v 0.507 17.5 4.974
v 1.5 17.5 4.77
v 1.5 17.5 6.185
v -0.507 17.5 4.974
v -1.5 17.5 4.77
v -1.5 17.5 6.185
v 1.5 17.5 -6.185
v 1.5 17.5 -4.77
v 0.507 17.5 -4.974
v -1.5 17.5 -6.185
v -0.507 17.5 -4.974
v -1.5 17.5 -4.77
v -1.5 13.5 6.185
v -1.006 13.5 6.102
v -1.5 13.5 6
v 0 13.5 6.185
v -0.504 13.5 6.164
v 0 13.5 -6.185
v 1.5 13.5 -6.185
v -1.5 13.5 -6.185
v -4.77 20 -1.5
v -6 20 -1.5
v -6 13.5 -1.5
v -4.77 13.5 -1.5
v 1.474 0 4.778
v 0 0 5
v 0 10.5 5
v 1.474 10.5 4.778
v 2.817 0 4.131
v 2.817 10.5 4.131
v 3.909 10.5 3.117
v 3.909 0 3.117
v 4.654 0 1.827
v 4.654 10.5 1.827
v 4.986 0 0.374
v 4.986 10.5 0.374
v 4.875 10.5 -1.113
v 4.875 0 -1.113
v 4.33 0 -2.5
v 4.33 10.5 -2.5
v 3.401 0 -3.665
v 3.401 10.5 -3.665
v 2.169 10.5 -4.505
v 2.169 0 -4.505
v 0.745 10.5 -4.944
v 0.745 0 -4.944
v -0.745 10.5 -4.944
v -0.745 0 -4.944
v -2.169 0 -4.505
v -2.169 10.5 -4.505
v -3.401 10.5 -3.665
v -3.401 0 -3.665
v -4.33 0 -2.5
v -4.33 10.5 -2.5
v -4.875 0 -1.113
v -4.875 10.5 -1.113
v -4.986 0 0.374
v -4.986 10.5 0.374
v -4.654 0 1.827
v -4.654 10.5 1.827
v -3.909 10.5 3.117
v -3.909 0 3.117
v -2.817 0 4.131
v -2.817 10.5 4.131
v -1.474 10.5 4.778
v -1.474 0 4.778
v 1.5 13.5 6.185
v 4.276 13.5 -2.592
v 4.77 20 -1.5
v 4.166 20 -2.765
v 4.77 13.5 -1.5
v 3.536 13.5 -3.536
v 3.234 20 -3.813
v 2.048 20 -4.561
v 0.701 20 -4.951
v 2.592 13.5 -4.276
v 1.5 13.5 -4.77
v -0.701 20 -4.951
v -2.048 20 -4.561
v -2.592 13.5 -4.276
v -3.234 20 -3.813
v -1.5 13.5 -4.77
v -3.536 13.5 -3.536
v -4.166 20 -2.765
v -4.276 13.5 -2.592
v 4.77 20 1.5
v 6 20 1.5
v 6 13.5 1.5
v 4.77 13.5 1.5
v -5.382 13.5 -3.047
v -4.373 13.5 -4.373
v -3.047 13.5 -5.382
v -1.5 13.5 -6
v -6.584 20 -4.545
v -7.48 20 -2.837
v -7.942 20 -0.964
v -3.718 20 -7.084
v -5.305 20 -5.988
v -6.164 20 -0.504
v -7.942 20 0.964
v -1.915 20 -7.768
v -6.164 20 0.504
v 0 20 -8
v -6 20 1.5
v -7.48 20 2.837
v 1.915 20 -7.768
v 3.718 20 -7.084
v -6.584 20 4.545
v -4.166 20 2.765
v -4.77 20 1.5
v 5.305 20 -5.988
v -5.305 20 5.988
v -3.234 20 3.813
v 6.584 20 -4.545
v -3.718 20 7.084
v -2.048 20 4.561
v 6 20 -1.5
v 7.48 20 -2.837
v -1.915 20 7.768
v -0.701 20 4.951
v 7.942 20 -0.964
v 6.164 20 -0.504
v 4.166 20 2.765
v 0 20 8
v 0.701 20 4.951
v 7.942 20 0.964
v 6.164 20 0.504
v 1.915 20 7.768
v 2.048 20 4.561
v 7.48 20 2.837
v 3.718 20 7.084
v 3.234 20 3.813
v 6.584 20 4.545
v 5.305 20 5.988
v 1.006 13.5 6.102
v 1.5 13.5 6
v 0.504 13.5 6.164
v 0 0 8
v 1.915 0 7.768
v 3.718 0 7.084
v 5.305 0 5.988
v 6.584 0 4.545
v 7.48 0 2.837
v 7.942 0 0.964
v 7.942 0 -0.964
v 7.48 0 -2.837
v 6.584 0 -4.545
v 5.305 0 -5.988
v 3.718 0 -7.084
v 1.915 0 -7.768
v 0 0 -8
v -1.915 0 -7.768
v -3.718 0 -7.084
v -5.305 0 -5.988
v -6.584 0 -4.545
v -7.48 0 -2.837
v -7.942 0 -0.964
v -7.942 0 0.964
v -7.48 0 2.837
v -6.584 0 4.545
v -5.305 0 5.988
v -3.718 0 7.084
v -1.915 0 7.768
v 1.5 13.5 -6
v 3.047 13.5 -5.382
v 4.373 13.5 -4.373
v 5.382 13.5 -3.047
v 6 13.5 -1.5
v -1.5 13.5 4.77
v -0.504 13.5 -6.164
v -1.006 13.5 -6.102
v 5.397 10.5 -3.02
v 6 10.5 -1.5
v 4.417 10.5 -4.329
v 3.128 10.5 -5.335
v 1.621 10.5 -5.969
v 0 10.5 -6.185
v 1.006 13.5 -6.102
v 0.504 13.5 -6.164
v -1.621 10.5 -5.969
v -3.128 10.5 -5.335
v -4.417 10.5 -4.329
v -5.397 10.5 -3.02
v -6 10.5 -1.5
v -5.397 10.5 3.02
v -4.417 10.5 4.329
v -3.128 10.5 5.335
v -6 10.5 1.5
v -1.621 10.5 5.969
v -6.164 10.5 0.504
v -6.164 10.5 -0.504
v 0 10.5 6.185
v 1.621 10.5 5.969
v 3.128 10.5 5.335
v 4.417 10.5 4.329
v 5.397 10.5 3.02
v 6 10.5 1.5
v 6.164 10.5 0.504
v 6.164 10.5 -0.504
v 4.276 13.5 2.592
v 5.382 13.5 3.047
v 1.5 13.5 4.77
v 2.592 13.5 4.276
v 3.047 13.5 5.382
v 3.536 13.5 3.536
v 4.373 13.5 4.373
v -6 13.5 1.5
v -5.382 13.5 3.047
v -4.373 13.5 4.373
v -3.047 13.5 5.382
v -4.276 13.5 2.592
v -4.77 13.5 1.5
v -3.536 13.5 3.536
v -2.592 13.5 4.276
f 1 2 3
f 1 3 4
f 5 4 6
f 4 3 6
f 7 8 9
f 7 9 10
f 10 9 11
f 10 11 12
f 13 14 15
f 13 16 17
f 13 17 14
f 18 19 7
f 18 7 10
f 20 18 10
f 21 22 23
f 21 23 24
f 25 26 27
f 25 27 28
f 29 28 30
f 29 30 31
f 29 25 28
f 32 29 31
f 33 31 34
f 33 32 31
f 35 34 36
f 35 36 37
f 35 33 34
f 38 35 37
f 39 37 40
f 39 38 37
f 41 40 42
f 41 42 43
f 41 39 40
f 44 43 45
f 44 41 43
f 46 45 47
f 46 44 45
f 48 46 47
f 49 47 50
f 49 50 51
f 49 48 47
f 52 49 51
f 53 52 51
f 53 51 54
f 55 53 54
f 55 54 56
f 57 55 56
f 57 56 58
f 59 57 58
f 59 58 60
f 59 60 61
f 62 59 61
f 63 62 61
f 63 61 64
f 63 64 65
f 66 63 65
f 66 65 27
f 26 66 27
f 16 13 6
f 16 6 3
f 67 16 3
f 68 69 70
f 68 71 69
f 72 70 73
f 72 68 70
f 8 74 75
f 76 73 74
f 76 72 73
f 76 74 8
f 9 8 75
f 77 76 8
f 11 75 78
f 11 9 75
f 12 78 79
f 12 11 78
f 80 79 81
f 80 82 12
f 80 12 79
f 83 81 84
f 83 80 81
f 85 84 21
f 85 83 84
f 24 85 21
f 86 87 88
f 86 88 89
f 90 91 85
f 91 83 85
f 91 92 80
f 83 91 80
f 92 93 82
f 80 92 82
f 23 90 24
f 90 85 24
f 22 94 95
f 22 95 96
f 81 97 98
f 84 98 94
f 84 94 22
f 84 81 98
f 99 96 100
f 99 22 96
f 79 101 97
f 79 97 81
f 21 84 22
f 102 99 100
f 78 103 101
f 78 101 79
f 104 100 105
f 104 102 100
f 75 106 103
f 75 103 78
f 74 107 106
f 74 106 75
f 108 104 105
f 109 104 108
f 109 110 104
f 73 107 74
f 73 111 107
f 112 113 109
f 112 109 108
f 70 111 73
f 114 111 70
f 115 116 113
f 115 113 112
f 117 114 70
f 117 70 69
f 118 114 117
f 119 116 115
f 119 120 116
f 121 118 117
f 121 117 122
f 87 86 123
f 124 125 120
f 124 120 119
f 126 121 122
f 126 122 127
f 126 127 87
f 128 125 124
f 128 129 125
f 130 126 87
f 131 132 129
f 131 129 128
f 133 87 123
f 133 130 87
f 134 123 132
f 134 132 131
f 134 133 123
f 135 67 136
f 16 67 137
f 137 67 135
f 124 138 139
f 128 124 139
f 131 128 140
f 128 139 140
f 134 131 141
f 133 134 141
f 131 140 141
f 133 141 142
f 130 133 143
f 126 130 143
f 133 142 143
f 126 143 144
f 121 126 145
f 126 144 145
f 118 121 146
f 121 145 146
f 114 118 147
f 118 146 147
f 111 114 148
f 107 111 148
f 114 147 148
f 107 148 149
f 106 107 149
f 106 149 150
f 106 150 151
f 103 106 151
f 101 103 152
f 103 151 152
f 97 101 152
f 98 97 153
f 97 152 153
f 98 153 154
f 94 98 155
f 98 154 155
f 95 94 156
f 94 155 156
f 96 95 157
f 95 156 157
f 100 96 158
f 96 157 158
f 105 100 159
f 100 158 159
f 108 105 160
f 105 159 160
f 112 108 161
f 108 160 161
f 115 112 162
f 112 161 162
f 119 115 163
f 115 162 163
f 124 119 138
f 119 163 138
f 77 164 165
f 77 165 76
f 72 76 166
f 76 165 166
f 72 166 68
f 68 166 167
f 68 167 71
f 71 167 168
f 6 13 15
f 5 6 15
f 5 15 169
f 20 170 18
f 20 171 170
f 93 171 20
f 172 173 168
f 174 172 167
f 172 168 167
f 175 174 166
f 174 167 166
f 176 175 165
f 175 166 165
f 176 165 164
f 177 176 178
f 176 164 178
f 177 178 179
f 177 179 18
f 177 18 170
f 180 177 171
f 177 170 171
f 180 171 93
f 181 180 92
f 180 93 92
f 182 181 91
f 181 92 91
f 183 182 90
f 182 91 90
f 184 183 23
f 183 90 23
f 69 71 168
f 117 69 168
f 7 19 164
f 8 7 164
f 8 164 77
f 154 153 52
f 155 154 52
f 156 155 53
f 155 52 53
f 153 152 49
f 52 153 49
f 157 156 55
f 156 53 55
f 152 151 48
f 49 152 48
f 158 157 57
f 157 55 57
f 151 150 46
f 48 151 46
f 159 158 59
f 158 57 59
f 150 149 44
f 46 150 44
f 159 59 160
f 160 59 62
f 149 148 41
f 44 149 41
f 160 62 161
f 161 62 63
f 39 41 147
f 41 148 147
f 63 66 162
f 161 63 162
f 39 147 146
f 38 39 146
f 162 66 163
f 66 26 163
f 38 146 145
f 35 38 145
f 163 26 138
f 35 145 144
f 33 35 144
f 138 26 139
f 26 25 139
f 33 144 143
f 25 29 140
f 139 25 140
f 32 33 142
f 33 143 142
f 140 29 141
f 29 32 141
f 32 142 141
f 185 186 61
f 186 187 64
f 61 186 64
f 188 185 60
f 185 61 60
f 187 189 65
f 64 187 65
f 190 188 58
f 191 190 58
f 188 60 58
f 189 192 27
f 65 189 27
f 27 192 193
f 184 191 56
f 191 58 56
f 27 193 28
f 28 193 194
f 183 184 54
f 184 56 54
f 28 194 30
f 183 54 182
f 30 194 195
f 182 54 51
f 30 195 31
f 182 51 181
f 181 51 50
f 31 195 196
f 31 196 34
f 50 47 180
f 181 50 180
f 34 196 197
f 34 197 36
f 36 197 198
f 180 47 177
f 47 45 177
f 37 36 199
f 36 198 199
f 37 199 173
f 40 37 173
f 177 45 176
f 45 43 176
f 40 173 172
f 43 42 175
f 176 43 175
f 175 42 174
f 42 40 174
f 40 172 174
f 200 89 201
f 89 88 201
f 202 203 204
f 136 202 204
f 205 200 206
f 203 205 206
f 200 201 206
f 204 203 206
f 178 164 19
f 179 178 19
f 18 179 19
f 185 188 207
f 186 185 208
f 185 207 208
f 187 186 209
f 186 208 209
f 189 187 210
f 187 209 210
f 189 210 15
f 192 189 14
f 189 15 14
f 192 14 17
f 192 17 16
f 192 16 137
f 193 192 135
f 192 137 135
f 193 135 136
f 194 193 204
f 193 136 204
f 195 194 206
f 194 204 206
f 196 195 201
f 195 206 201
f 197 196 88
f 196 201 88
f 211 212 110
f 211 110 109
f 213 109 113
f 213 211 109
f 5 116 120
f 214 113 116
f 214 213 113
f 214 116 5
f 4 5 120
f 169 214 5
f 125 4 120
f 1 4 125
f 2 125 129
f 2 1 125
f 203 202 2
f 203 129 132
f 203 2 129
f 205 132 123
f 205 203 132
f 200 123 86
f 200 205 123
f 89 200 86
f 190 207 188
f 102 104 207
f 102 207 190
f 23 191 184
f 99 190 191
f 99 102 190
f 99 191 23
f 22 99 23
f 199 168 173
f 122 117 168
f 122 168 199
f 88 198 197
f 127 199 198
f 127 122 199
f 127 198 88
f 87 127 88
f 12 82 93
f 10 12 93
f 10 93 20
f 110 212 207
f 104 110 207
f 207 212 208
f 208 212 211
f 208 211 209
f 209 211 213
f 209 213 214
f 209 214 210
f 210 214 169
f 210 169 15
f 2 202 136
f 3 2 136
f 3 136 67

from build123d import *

# Parameters (mm, degrees)
SKETCH_1_R          = 8
SKETCH_1_R_2        = 5
EXTRUDE_1_DEPTH     = 20
CUT_EXTRUDE_2_DEPTH = 9.5
CUT_EXTRUDE_3_DEPTH = 4


with BuildPart() as part:
    # Эскиз1 → Вытянуть1 (new body)
    with BuildSketch(Plane(origin=(0, 0, 0), x_dir=(1, 0, 0), z_dir=(0, 1, 0))):
        with Locations(Location((0, 0, 0), (0, 0, 270))):
            Circle(SKETCH_1_R)
        with Locations(Location((0, 0, 0), (0, 0, 270))):
            Circle(SKETCH_1_R_2, mode=Mode.SUBTRACT)
    extrude(amount=EXTRUDE_1_DEPTH)

    # Эскиз2 → Вытянуть2 (cut)
    with BuildSketch(Plane(origin=(0, 20, 0), x_dir=(1, 0, 0), z_dir=(0, 1, 0))):
        with BuildLine():
            Line((-6, 1.5), (6, 1.5))
            ThreePointArc((6, 1.5), (6.184658438, 0), (6, -1.5))
            Line((6, -1.5), (-6, -1.5))
            ThreePointArc((-6, -1.5), (-6.184658438, 0), (-6, 1.5))
        make_face()
    extrude(amount=-CUT_EXTRUDE_2_DEPTH, mode=Mode.SUBTRACT)

    # Эскиз4 → Вырез-Повернуть2 (revolve, cut)
    with BuildSketch(Plane.XY, mode=Mode.PRIVATE) as cut_revolve_2_sk:
        Polygon((0, 10.5), (6, 10.5), (6.184658438, 10.5), (6.184658438, 13.5), (6, 13.5), (0, 13.5), align=None)
    revolve(cut_revolve_2_sk.sketch.rotate(Axis((0, 0, 0), (0, 1, 0)), 270), axis=Axis((0, 0, 0), (0, 1, 0)), mode=Mode.SUBTRACT)

    # Эскиз5 → Вытянуть3 (cut)
    with BuildSketch(Plane.XZ.offset(-13.5)):
        Polygon((-1.5, 6.184658438), (1.5, 6.184658438), (1.5, 6), (1.5, -6), (1.5, -6.184658438), (-1.5, -6.184658438), (-1.5, -6), (-1.5, 6), align=None)
    extrude(amount=-CUT_EXTRUDE_3_DEPTH, mode=Mode.SUBTRACT)


solid = part.part
